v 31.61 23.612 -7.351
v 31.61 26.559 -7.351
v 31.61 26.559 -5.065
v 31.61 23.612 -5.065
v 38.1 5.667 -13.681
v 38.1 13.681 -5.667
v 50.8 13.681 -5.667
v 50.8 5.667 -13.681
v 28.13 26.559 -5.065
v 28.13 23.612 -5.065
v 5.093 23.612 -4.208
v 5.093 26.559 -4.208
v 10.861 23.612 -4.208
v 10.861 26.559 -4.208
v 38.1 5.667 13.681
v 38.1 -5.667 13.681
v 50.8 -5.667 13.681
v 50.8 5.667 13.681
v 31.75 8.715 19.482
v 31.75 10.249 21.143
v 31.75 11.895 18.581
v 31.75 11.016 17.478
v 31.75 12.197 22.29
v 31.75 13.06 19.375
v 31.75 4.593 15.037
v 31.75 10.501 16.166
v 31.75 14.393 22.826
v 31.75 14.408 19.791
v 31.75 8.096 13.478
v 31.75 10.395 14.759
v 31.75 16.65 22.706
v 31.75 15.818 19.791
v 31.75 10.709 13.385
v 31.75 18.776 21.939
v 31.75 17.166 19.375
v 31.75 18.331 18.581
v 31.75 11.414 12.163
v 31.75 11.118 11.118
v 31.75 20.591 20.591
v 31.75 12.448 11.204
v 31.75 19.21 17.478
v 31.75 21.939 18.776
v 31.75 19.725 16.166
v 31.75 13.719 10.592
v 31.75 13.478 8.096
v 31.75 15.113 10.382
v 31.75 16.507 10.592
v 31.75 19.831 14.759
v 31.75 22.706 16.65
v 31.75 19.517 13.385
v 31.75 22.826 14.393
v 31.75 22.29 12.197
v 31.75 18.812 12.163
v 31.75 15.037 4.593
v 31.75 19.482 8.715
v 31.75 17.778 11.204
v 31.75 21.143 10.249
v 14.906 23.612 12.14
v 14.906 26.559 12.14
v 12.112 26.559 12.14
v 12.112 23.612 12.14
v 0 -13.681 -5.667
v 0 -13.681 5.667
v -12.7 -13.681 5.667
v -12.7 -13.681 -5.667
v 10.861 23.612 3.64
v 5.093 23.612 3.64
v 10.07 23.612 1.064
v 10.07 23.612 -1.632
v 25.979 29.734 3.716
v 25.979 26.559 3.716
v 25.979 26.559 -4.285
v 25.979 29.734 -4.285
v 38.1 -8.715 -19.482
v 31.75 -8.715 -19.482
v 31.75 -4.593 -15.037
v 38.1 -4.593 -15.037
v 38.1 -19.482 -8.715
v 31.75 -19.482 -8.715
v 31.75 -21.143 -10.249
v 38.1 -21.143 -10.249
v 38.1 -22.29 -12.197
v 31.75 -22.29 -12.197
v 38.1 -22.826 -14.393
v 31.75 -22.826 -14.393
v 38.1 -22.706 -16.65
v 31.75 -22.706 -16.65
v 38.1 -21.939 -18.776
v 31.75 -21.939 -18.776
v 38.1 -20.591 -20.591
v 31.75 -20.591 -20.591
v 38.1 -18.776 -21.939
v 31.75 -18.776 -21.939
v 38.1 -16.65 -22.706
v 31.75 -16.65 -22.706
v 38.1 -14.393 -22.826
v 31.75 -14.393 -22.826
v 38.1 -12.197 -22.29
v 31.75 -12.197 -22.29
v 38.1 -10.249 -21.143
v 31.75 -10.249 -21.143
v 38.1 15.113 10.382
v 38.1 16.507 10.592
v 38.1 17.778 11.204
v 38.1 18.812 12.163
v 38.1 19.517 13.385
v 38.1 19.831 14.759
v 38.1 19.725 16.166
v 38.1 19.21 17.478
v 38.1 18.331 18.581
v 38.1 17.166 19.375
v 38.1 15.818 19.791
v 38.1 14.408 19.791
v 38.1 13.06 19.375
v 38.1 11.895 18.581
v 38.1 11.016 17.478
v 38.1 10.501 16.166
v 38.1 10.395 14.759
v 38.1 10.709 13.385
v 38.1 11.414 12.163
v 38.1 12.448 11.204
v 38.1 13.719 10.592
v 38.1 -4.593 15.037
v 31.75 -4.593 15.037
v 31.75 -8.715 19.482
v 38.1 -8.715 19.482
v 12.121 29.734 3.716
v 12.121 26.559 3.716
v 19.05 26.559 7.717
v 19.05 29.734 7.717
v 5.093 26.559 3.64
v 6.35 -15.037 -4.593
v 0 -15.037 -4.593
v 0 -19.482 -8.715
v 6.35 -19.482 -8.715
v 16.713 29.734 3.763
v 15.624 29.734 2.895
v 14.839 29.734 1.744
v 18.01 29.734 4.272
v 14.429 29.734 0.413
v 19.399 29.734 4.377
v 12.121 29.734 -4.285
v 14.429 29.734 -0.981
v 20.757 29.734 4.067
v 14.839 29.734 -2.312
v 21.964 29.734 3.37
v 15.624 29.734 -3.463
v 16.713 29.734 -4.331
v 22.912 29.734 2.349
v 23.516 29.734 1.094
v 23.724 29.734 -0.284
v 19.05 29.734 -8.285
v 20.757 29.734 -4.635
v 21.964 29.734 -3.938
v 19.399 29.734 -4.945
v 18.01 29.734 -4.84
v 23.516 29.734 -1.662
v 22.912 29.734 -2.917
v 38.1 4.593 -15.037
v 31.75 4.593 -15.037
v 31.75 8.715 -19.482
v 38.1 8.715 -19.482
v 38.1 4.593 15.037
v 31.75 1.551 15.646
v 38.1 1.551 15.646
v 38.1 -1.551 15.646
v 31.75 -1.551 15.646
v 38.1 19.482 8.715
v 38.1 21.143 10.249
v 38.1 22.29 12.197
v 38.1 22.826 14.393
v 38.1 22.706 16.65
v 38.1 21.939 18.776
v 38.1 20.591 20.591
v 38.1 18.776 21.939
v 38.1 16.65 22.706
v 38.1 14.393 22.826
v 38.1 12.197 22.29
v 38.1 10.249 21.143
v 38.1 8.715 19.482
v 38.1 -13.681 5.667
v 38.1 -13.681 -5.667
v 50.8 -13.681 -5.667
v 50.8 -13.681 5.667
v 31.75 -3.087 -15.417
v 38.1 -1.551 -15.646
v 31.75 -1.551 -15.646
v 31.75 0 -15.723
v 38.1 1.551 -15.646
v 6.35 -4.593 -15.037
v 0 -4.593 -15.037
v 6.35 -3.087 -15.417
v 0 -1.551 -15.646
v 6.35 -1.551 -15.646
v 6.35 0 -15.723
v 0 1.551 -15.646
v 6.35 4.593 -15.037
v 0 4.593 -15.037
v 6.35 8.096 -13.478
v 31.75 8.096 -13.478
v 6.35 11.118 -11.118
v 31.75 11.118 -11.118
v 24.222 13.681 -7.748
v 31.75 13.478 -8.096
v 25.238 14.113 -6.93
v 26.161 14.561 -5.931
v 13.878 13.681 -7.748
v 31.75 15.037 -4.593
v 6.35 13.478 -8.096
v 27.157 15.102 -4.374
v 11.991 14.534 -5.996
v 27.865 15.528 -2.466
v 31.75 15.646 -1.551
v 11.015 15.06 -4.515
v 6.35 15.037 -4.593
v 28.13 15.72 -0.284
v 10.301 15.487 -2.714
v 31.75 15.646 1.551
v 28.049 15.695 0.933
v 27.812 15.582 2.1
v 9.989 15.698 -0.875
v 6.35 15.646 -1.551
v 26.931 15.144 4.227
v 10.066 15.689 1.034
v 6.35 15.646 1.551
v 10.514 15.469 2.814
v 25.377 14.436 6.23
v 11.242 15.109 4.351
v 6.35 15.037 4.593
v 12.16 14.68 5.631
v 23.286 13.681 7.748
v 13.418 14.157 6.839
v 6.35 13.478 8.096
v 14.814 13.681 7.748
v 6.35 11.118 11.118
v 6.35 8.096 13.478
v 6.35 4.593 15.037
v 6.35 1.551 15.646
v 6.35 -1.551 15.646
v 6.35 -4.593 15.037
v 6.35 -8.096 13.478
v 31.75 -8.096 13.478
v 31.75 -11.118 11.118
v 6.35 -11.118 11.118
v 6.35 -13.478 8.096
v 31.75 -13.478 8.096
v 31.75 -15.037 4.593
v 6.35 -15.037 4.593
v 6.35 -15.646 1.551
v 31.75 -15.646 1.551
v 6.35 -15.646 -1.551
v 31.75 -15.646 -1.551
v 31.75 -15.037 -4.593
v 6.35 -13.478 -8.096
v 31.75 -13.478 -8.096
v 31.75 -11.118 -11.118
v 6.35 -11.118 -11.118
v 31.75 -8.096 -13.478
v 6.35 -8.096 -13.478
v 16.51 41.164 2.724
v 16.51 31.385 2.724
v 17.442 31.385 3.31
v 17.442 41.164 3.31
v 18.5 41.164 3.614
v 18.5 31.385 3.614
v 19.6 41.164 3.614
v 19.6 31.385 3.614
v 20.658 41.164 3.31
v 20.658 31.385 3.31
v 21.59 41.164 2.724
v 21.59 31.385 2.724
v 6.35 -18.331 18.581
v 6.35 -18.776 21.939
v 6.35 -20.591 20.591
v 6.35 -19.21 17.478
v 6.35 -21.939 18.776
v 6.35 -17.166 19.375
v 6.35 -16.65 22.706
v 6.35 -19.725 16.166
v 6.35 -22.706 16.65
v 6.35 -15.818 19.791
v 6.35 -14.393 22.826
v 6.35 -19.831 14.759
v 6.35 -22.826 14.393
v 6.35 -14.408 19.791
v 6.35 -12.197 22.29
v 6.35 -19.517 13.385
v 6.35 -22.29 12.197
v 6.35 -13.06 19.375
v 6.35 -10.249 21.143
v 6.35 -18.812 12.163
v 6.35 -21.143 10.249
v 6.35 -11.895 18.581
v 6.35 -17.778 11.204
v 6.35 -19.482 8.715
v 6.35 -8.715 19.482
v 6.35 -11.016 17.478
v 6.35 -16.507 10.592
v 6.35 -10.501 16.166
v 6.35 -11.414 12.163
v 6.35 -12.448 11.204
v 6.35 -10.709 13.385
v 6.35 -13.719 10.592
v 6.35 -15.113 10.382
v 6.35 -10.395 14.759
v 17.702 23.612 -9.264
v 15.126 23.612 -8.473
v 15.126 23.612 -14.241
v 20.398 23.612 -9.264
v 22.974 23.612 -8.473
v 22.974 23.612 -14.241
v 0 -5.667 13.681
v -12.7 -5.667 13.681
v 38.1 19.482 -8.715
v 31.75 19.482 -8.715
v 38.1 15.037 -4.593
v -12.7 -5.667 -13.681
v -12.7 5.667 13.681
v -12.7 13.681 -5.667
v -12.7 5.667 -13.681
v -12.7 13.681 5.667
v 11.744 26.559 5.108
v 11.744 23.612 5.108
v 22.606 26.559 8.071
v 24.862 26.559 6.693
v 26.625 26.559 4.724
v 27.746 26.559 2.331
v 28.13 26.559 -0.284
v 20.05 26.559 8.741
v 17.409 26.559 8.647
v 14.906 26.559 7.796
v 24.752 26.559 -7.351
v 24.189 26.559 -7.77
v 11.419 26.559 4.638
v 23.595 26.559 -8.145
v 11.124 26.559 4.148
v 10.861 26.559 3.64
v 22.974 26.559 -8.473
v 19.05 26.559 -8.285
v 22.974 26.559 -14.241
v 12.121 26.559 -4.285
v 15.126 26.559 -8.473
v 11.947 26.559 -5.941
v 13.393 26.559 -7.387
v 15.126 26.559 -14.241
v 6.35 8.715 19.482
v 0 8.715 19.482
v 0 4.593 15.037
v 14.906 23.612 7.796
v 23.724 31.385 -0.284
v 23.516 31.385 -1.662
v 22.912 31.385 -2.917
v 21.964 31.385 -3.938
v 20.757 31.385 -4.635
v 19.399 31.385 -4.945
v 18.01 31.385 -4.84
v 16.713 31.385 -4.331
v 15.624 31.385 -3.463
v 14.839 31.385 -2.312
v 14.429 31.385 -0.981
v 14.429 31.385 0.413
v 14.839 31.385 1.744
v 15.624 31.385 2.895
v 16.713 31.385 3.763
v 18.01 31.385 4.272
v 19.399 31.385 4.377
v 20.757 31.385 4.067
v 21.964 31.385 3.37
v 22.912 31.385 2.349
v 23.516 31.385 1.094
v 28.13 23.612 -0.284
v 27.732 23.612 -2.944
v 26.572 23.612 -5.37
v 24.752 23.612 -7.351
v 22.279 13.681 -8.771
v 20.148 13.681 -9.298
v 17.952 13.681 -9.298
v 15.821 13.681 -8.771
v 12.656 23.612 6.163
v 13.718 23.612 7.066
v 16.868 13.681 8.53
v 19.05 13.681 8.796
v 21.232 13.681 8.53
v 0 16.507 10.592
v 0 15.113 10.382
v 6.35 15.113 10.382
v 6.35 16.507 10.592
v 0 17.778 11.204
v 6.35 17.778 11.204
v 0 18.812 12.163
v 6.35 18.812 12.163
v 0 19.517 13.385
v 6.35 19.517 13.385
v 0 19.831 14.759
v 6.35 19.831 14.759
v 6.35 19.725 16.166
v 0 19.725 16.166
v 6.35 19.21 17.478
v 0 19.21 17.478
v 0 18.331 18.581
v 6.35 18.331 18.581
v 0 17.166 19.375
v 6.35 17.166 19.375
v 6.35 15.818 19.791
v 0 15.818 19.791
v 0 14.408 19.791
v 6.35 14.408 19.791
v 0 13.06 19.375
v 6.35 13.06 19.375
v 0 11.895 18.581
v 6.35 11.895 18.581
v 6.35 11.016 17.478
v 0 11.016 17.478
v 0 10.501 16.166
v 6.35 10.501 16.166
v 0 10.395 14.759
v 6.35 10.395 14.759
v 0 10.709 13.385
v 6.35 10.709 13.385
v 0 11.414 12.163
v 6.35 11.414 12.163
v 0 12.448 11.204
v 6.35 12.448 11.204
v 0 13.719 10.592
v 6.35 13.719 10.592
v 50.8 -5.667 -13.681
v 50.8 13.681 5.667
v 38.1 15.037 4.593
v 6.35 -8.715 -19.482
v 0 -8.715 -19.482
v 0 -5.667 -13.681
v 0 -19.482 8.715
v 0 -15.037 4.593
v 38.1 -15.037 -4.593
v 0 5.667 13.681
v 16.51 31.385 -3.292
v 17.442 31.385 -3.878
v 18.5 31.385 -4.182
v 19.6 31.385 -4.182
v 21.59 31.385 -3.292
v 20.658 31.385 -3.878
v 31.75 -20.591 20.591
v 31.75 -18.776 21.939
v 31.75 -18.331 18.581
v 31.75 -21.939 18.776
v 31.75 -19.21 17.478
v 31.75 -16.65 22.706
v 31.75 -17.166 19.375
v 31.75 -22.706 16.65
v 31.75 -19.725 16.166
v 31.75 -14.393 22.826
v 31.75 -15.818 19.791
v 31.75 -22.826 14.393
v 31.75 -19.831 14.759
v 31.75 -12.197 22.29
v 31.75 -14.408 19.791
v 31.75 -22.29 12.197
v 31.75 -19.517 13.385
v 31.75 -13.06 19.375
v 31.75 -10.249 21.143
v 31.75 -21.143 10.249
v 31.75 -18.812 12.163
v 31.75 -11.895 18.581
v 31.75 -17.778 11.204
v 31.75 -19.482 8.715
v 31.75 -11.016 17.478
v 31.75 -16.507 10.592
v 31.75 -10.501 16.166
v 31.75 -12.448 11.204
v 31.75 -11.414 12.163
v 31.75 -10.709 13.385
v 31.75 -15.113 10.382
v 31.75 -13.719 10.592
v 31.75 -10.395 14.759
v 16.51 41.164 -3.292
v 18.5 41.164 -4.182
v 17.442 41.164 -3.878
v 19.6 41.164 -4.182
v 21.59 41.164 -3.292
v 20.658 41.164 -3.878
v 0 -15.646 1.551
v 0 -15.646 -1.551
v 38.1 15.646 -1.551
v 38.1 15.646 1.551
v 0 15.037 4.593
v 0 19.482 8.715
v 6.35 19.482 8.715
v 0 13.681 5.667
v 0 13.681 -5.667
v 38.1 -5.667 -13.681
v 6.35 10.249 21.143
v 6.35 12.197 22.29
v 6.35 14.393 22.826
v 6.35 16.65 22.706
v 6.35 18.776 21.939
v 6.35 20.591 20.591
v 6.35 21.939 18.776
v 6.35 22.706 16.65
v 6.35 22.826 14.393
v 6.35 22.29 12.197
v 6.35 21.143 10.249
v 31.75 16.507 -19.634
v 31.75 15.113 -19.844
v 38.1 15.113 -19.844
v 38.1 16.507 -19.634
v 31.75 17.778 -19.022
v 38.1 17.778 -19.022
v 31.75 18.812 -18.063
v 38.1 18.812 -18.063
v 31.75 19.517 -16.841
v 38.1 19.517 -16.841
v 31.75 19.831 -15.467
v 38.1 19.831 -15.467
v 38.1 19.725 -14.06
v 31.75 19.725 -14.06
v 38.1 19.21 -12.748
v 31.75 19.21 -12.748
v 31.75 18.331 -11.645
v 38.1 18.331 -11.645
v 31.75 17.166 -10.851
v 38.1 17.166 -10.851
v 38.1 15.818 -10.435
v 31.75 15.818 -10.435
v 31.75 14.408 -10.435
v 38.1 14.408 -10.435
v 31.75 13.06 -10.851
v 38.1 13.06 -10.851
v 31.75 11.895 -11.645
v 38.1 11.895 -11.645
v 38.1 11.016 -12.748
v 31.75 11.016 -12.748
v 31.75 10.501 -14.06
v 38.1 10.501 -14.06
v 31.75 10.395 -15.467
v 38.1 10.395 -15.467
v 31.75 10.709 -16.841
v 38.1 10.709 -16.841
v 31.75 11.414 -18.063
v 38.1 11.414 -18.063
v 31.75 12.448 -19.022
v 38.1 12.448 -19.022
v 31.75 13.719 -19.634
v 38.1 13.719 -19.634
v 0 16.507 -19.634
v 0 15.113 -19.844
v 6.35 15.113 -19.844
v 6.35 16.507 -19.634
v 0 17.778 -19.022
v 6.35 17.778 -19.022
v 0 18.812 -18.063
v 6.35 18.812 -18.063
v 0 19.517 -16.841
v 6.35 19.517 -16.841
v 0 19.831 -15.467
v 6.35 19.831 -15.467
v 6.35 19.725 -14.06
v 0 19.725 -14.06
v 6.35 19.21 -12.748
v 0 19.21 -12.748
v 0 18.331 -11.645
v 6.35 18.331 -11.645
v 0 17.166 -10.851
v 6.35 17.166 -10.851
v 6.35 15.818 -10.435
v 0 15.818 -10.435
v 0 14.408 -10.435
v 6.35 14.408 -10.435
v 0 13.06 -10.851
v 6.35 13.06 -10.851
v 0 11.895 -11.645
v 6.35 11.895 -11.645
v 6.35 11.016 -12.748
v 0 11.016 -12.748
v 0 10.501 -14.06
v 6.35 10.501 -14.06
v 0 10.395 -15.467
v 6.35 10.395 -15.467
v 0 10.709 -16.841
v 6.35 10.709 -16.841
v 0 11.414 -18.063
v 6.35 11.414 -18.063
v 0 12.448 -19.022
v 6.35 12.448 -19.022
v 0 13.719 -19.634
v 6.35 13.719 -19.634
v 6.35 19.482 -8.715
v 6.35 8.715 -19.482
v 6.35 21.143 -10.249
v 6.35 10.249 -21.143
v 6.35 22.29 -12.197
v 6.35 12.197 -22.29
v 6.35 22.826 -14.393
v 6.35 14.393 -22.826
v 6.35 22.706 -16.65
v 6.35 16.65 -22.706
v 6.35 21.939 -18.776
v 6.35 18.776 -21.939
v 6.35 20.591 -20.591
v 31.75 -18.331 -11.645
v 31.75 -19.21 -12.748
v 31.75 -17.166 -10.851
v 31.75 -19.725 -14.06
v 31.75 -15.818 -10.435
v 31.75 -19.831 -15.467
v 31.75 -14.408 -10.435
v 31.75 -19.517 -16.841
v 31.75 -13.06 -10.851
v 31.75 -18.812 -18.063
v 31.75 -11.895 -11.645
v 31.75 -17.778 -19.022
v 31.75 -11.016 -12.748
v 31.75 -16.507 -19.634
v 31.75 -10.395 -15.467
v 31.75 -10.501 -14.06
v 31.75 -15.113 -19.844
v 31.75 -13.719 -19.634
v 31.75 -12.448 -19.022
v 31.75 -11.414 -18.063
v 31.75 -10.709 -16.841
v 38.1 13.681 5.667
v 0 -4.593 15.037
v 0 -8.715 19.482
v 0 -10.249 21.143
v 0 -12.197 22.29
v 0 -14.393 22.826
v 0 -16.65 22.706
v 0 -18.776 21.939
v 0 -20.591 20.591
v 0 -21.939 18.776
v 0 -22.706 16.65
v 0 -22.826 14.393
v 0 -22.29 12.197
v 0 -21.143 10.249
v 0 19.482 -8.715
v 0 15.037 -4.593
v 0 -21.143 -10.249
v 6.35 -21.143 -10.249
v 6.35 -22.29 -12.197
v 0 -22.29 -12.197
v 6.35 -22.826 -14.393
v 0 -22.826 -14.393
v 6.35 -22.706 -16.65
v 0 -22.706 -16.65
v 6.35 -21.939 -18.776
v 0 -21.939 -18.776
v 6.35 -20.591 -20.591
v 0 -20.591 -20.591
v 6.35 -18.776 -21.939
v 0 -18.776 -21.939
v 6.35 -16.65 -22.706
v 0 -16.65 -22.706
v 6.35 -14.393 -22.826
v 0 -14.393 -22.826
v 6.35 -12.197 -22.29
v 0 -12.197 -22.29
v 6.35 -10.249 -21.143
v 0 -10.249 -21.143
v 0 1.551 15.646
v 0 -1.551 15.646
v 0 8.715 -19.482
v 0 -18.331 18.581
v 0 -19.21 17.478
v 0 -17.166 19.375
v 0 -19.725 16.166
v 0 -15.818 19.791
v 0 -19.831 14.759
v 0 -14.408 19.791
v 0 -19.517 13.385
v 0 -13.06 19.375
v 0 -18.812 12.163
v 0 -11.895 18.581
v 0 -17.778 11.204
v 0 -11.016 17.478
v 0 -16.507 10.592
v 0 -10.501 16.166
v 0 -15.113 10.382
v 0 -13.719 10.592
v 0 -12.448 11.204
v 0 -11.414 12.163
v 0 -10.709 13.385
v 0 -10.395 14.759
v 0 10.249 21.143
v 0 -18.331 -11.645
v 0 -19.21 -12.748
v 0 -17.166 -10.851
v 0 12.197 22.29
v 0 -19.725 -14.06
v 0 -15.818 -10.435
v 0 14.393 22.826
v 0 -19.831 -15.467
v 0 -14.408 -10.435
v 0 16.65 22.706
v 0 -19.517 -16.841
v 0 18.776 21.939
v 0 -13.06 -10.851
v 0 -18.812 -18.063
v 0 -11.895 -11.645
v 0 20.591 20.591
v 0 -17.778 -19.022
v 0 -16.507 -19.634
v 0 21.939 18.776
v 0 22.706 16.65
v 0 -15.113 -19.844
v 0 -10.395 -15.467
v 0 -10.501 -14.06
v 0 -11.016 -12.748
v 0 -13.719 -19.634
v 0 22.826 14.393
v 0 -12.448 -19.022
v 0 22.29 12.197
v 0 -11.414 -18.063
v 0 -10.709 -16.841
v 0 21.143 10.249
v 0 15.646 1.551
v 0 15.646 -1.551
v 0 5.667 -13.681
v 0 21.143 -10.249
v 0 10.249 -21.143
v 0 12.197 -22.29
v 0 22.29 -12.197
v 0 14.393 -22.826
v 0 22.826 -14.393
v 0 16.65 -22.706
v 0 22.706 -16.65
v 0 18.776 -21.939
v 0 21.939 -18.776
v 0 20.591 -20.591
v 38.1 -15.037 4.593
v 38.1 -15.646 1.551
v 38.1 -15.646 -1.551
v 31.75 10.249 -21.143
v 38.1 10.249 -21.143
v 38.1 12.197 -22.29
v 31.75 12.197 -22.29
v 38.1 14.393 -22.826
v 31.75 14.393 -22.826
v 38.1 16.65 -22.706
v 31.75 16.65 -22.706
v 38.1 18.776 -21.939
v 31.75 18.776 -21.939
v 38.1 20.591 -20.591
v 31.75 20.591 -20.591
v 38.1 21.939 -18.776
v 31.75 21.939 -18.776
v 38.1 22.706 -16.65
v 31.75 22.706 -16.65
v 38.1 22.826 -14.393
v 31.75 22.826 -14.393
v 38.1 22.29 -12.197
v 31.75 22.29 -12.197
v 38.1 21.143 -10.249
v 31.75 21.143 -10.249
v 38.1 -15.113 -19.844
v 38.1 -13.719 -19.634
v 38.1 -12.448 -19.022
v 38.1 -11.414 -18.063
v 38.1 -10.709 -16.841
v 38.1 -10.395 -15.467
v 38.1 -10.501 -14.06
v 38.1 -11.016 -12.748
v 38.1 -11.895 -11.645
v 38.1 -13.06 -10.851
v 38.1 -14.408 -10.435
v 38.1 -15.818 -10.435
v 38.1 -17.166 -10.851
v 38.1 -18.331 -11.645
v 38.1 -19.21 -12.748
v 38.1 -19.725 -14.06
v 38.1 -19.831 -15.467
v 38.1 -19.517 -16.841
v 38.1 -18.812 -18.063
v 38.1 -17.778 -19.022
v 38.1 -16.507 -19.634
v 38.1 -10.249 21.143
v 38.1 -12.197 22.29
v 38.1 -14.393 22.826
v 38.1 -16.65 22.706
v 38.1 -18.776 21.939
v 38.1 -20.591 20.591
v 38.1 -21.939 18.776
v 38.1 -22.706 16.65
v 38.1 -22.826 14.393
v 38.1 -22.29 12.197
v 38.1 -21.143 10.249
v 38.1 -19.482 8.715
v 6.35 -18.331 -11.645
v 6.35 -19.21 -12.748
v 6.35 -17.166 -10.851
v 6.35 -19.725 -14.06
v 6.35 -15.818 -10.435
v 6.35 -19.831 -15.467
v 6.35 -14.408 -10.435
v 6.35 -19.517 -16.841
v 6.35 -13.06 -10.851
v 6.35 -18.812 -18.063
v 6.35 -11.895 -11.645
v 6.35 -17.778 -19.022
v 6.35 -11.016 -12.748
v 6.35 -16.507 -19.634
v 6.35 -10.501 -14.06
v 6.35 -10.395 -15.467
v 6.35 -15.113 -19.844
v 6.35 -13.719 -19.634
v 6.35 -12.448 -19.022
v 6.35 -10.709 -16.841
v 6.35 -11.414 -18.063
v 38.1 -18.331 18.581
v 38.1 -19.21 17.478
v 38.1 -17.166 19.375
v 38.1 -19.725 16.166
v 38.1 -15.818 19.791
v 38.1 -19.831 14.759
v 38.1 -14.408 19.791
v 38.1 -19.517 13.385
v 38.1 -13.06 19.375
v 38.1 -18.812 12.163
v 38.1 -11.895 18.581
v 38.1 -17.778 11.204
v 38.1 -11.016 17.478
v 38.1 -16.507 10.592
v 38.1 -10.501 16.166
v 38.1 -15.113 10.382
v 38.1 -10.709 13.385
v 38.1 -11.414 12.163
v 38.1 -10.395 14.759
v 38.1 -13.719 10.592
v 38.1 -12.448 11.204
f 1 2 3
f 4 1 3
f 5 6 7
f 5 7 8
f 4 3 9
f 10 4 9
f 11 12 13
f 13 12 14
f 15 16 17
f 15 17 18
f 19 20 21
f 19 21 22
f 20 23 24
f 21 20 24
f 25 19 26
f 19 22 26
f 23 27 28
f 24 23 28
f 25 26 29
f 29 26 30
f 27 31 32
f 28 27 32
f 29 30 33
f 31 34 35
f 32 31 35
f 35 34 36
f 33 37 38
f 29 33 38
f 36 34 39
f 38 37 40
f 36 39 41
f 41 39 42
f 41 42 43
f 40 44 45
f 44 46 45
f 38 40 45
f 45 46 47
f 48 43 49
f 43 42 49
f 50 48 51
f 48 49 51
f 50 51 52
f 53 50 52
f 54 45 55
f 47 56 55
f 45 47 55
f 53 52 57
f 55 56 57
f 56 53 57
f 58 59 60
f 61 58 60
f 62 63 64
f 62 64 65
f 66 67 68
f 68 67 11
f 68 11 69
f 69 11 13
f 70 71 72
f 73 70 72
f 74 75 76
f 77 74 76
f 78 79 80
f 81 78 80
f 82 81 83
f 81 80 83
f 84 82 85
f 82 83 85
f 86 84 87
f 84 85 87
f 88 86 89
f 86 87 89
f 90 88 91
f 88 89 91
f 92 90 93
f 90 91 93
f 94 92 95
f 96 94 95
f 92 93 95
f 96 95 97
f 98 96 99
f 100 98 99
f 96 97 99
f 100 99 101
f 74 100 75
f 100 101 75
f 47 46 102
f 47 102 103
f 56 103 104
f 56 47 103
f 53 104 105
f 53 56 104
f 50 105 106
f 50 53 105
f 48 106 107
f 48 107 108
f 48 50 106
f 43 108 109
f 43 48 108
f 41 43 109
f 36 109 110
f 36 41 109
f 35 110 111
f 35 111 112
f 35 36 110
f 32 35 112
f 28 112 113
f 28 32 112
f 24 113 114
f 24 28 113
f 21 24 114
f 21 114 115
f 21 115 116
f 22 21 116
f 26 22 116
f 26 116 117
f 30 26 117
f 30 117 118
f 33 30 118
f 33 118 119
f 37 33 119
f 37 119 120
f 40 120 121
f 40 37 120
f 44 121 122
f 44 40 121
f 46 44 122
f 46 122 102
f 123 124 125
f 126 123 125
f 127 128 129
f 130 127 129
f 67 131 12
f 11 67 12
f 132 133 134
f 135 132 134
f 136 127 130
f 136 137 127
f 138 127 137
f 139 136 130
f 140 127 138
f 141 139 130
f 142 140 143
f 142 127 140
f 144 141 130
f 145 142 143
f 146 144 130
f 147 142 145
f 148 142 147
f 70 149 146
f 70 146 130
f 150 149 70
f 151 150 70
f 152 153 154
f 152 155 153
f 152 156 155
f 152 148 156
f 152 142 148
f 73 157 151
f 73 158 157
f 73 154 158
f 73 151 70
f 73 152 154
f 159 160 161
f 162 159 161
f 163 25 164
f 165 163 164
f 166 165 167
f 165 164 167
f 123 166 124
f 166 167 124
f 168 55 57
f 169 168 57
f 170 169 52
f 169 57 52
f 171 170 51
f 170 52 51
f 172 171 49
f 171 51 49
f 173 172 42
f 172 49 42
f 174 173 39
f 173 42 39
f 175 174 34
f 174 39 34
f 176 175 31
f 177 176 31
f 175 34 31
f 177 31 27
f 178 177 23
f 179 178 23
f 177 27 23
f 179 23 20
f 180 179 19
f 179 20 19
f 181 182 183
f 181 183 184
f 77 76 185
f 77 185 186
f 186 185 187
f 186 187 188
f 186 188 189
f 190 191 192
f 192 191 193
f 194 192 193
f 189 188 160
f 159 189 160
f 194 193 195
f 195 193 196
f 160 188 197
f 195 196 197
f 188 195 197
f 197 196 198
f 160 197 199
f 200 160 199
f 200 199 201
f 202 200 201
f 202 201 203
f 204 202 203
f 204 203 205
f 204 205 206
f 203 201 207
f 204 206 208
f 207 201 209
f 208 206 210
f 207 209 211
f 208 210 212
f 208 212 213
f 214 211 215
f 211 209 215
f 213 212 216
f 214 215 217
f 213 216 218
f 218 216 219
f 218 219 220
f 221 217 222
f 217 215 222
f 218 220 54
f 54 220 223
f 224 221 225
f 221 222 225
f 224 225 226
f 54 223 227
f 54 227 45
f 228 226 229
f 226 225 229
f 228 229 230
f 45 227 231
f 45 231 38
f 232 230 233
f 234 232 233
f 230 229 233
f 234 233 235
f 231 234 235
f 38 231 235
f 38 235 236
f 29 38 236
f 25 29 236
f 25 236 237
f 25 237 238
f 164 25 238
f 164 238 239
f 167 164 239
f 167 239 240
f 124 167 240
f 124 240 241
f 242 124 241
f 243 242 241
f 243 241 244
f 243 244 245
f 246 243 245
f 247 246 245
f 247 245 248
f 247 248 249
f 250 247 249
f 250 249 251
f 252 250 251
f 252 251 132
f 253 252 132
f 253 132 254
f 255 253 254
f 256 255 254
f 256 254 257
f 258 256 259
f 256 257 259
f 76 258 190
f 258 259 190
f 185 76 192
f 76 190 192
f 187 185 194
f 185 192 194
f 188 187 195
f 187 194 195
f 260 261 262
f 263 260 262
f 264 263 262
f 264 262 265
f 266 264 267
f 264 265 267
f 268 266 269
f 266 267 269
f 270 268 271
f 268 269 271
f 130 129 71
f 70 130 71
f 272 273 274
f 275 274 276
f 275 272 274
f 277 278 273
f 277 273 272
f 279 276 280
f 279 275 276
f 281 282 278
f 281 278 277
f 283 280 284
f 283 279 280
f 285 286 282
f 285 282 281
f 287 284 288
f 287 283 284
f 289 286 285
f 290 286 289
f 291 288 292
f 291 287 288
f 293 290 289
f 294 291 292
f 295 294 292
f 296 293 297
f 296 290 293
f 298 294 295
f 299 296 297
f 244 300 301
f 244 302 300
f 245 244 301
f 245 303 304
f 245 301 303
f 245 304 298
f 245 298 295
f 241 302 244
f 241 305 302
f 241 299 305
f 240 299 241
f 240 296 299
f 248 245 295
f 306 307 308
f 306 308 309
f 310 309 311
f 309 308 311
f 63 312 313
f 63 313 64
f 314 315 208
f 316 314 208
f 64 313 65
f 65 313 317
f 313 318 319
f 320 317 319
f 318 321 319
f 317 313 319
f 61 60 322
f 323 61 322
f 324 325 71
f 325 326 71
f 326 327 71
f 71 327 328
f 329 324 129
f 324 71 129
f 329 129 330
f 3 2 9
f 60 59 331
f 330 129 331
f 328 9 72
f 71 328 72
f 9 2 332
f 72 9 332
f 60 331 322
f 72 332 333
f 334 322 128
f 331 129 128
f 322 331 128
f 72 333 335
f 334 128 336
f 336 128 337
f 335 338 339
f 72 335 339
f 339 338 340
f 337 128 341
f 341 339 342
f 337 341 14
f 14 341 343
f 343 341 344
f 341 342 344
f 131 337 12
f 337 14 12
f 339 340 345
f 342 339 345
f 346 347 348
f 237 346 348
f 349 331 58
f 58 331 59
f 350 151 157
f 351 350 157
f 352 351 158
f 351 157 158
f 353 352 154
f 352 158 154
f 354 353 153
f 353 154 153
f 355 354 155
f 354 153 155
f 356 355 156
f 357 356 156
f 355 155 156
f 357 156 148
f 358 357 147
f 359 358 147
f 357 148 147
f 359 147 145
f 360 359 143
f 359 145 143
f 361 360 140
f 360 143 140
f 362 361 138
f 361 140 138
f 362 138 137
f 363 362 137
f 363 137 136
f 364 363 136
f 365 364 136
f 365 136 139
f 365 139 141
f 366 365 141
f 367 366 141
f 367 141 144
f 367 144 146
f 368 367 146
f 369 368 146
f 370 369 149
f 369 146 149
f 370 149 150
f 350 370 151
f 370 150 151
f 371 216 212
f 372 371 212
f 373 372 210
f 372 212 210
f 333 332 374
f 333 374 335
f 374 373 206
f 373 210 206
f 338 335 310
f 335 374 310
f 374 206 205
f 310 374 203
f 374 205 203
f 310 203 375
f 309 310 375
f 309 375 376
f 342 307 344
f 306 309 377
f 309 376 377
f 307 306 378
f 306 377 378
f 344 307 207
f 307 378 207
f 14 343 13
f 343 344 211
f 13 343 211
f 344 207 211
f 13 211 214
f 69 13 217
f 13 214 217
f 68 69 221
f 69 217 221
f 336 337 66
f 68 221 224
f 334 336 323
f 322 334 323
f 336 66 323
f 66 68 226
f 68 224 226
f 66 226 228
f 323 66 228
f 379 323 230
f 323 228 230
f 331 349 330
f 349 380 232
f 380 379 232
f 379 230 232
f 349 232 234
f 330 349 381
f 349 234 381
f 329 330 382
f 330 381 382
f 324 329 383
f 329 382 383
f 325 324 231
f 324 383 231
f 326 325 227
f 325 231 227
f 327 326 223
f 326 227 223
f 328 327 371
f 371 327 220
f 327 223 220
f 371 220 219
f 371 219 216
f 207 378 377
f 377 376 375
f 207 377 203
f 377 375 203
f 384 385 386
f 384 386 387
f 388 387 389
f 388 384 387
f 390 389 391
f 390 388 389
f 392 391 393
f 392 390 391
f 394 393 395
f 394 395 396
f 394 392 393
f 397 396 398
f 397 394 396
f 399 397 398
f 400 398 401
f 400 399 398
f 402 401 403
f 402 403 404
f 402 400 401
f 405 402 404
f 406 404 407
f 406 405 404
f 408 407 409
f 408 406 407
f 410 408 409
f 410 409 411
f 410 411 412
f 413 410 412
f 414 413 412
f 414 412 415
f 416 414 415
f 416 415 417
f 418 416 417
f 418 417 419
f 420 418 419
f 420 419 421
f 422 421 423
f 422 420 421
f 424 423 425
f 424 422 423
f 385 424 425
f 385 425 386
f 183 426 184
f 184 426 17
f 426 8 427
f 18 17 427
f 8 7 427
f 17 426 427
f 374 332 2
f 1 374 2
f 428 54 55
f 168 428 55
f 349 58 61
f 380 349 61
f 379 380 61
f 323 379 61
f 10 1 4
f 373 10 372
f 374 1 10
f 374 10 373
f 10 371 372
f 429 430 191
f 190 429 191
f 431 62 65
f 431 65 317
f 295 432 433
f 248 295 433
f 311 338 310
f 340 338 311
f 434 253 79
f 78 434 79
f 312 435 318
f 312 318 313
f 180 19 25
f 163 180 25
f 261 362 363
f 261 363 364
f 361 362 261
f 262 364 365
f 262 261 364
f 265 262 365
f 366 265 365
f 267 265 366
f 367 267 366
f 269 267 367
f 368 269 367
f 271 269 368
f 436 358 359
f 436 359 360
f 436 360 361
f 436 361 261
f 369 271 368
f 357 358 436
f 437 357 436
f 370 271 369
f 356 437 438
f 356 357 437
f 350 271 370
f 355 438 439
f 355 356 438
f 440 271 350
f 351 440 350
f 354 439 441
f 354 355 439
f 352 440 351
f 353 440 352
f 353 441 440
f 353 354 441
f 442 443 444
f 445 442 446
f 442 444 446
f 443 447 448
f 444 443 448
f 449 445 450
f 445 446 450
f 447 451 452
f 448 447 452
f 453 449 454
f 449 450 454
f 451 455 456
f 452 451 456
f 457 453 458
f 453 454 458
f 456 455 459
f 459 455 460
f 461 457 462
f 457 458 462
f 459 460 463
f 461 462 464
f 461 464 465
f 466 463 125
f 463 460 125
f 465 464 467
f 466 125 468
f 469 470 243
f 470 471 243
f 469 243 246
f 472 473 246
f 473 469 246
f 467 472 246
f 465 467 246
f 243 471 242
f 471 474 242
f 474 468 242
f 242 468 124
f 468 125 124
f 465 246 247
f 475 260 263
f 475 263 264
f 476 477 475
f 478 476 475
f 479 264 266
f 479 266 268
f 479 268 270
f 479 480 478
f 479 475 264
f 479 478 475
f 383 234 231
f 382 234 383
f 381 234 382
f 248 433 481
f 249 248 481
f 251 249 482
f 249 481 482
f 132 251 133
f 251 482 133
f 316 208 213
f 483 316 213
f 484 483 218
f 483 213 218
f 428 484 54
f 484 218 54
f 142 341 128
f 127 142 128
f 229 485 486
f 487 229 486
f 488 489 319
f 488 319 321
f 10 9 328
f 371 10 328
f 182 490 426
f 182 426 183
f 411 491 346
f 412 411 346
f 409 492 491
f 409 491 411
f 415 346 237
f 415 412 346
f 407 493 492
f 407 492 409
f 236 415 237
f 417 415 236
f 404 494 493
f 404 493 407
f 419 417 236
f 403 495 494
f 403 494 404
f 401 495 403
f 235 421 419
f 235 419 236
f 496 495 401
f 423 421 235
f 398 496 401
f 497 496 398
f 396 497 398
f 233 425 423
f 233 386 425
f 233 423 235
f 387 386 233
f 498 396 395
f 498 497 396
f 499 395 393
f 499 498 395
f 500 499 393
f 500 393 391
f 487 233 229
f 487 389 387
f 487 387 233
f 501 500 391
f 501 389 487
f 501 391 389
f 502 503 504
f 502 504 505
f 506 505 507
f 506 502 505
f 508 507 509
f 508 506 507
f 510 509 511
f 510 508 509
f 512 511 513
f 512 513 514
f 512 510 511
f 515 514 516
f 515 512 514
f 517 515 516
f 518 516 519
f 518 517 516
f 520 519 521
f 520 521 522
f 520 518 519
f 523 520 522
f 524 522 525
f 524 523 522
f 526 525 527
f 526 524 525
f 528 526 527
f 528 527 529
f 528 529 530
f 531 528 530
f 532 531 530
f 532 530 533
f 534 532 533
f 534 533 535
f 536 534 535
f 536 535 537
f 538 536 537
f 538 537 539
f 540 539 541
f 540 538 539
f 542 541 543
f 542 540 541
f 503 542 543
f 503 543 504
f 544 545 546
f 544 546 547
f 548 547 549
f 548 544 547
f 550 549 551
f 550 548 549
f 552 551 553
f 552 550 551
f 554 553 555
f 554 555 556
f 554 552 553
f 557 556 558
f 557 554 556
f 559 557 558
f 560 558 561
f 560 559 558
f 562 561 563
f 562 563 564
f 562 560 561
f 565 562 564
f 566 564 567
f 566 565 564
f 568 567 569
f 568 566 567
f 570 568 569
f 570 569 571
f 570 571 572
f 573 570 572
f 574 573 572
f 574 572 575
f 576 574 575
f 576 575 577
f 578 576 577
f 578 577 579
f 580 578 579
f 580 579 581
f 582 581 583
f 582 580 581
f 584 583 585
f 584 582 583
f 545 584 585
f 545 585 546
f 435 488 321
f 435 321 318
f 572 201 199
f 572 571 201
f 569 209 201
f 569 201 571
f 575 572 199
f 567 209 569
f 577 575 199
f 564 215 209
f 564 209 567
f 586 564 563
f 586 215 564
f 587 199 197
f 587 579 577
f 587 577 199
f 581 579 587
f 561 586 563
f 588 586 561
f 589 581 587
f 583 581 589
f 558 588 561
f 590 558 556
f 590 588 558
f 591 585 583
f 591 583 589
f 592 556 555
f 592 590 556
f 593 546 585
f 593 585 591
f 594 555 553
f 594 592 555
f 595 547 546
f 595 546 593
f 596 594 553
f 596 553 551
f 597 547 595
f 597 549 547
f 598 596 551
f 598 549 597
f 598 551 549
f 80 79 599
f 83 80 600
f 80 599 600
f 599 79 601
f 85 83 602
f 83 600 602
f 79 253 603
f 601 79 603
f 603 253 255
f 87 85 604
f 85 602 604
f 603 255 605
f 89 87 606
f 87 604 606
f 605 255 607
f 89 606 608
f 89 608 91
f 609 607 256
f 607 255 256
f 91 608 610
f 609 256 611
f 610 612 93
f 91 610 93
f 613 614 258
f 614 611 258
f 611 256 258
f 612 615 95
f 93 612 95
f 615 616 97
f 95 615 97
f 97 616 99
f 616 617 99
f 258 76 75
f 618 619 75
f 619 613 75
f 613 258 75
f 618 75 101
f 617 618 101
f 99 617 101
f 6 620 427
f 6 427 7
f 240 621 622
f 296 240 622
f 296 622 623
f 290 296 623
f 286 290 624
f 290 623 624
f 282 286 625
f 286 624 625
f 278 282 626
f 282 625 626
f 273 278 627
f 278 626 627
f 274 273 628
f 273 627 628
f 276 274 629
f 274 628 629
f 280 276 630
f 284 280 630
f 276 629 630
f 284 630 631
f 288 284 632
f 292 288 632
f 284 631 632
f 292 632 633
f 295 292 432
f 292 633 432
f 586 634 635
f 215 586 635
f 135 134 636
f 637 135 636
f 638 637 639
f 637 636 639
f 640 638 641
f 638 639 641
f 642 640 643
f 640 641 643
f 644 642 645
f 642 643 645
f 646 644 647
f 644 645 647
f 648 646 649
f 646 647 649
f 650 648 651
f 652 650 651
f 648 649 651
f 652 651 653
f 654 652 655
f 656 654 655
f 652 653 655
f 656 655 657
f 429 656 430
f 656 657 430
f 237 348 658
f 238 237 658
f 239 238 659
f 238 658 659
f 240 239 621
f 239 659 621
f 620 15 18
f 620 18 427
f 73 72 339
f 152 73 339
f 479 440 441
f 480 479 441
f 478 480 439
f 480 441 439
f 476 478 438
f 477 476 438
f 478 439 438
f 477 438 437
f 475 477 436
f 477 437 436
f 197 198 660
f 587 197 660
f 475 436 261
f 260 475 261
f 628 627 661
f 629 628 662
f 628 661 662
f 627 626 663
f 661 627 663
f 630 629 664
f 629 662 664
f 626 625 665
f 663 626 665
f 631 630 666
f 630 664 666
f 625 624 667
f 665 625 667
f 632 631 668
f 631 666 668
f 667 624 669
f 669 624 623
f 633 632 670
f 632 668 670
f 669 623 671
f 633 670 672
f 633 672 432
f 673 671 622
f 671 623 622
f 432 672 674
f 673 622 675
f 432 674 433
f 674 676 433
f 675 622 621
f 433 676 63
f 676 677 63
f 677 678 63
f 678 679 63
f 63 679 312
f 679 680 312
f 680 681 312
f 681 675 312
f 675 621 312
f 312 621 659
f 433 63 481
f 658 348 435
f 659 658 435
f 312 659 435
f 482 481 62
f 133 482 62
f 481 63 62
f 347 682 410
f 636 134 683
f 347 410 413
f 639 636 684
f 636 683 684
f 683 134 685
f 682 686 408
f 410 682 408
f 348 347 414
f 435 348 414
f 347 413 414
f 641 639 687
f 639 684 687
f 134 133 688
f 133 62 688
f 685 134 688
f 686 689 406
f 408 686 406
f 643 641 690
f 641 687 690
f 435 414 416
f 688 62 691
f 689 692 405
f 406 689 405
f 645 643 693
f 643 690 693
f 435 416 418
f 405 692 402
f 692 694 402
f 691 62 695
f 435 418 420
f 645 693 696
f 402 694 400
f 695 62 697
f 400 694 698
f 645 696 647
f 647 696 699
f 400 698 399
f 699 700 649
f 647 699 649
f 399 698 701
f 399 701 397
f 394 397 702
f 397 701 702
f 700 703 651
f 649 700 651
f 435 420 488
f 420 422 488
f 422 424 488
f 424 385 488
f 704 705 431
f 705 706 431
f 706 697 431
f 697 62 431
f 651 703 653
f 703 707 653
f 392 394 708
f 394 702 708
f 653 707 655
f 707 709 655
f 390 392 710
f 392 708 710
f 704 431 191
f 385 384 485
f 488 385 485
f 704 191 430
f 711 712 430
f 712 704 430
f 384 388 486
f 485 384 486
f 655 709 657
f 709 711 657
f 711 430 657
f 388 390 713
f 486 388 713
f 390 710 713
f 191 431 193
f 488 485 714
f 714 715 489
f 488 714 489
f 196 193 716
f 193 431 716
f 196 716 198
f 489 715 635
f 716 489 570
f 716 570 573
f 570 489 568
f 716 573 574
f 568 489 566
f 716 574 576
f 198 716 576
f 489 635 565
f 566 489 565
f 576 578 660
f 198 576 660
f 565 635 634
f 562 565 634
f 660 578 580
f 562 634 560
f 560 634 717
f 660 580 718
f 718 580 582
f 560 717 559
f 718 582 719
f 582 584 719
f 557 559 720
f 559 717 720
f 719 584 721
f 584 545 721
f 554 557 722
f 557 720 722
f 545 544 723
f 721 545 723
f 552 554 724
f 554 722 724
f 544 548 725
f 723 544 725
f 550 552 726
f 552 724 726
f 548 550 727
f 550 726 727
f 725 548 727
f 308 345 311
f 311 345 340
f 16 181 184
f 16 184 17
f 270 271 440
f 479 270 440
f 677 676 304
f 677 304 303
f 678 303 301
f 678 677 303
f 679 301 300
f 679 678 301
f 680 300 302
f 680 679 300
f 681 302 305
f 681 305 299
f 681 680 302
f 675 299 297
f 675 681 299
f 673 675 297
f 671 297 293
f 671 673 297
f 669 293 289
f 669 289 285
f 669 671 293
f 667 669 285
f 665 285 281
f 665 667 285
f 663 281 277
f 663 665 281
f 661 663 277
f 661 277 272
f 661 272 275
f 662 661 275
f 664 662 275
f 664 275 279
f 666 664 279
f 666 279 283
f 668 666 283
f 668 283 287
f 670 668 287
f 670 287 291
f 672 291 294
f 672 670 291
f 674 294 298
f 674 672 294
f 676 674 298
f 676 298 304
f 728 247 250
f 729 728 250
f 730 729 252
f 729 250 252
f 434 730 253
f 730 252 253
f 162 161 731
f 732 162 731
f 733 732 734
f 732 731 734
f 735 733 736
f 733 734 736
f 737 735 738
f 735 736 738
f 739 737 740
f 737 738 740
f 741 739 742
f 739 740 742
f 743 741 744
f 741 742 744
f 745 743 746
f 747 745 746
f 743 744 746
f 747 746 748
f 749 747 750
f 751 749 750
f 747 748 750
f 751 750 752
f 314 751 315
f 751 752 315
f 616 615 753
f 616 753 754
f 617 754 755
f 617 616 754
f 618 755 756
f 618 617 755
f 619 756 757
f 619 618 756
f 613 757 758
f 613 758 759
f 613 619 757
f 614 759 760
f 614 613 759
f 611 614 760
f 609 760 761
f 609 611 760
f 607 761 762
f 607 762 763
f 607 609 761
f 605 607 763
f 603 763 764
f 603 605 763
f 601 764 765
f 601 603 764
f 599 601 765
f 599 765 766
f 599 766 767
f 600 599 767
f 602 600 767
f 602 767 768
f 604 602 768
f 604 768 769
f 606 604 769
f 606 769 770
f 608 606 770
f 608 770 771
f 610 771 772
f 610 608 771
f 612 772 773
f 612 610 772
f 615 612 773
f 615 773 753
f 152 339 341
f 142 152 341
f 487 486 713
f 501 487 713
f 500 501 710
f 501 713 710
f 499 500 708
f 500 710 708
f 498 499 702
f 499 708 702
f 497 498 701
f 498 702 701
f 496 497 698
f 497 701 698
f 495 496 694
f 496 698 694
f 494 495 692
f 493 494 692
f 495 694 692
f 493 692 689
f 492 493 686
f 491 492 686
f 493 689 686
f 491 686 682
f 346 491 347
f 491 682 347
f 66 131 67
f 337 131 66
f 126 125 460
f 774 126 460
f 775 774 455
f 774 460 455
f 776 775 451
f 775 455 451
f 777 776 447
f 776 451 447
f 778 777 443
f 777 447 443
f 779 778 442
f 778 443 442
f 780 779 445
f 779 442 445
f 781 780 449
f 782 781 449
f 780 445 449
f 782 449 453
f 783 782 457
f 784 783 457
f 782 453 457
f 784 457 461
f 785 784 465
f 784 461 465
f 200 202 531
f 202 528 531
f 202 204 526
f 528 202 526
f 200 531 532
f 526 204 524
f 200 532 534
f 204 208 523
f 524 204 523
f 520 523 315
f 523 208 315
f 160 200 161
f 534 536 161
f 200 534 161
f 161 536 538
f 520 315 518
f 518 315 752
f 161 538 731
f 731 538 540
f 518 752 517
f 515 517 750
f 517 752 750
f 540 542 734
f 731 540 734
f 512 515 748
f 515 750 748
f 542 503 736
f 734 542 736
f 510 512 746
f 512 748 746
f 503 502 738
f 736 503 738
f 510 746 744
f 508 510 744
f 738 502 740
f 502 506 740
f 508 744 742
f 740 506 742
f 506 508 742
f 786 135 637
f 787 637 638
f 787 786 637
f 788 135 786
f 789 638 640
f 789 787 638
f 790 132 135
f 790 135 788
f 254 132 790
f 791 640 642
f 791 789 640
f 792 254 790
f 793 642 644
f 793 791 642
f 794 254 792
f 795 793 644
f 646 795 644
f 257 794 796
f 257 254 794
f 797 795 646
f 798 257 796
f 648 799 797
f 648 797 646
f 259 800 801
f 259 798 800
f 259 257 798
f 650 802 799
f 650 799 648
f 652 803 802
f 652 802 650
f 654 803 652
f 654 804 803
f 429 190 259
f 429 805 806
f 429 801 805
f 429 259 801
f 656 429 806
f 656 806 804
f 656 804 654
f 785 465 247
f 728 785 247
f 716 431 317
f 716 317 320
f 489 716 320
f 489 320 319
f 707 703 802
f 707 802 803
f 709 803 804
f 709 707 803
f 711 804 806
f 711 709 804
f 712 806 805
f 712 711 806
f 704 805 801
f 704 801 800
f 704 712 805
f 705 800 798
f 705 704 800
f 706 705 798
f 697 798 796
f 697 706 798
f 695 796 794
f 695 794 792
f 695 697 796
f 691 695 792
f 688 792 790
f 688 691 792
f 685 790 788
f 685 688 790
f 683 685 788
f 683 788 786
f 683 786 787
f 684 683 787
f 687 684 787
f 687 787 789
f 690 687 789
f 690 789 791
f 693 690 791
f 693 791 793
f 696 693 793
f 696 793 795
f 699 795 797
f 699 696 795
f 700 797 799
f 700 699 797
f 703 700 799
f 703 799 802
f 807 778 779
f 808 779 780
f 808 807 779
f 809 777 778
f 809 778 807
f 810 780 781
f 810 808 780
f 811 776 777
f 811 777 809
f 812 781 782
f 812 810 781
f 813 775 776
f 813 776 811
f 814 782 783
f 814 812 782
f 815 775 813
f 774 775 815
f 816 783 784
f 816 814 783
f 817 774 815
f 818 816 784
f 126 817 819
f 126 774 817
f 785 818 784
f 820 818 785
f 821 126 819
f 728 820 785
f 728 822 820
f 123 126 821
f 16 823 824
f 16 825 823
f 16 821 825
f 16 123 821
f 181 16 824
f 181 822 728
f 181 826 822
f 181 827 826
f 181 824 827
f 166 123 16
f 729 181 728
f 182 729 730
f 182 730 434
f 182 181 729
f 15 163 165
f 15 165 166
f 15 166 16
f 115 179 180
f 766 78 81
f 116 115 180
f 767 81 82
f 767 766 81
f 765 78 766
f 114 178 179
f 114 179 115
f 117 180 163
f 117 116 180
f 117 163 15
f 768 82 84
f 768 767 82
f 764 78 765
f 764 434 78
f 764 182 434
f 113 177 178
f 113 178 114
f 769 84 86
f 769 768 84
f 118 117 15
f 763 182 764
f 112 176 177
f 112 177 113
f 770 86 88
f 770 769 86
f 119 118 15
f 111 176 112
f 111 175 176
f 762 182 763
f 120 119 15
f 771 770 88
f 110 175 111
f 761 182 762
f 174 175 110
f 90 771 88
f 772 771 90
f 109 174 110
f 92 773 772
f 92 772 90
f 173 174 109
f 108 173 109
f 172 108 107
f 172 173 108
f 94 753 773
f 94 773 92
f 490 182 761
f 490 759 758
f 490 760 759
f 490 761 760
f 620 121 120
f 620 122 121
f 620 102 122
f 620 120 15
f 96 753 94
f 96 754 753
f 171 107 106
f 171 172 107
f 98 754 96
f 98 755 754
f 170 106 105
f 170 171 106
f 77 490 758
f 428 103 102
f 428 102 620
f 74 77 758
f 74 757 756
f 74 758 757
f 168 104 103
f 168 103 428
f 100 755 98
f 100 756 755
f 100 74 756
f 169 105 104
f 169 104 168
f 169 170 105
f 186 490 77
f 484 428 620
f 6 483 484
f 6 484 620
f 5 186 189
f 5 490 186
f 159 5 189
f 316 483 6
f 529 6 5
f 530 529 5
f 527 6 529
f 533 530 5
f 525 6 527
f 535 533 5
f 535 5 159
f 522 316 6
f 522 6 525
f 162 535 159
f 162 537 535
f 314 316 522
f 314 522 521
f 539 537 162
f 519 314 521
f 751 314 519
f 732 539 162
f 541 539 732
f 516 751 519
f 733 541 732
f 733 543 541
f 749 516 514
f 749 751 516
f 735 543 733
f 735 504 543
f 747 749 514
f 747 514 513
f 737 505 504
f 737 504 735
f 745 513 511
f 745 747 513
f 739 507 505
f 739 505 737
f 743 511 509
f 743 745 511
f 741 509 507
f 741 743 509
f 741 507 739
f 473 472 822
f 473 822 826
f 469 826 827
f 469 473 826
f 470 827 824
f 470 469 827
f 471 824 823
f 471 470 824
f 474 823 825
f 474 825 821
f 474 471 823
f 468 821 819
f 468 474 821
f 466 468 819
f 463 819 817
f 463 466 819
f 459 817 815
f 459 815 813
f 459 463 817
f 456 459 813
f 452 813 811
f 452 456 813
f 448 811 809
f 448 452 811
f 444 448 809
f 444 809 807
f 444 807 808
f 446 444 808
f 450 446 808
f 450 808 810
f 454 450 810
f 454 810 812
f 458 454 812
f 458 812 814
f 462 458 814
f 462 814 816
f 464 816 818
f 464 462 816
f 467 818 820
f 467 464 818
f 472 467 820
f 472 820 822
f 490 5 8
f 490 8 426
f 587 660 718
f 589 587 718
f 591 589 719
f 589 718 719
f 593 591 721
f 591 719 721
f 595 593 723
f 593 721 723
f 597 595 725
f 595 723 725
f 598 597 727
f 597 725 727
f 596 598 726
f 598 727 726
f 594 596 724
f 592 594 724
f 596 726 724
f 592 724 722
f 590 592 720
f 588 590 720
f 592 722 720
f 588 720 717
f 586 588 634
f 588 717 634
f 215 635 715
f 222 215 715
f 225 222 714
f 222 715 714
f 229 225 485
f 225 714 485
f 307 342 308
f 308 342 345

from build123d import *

# Parameters (mm, degrees)
SKETCH1_R            = 4.73075
BOSS_EXTRUDE2_DEPTH  = 6.35
BOSS_EXTRUDE3_DEPTH  = 12.7
SKETCH3_R            = 15.7226
BOSS_EXTRUDE4_DEPTH  = 25.4
SKETCH4_R            = 4.73075
BOSS_EXTRUDE5_DEPTH  = 6.35
BOSS_EXTRUDE6_DEPTH  = 12.7
SKETCH6_R            = 9.0805
BOSS_EXTRUDE8_DEPTH  = 12.8778
SKETCH8_W            = 7.8486
SKETCH8_H            = 8.0772
SKETCH8_W_2          = 8.0772
SKETCH8_H_2          = 7.8486
BOSS_EXTRUDE9_DEPTH  = 2.9464
BOSS_EXTRUDE10_DEPTH = 2.9464
BOSS_EXTRUDE11_DEPTH = 3.175
SKETCH12_R           = 4.6736
BOSS_EXTRUDE12_DEPTH = 1.651
BOSS_EXTRUDE13_DEPTH = 9.779


with BuildPart() as part:
    # Sketch1 → Boss-Extrude2 (new body)
    with BuildSketch(Plane(origin=(0, 0, 0), x_dir=(0, 0, -1), z_dir=(1, 0, 0))):
        with BuildLine():
            Line((-19.4818, 8.715375788), (-15.0368, 4.592907197))
            ThreePointArc((-15.0368, 4.592907197), (-15.7226, 0), (-15.0368, -4.592907197))
            Line((-15.0368, -4.592907197), (-19.4818, -8.715375788))
            ThreePointArc((-19.4818, -8.715375788), (-20.590956234, -20.590956234), (-8.715375788, -19.4818))
            Line((-8.715375788, -19.4818), (-4.592907197, -15.0368))
            ThreePointArc((-4.592907197, -15.0368), (0, -15.7226), (4.592907197, -15.0368))
            Line((4.592907197, -15.0368), (8.715375788, -19.4818))
            ThreePointArc((8.715375788, -19.4818), (20.590956234, -20.590956234), (19.4818, -8.715375788))
            Line((19.4818, -8.715375788), (15.0368, -4.592907197))
            ThreePointArc((15.0368, -4.592907197), (15.7226, 0), (15.0368, 4.592907197))
            Line((15.0368, 4.592907197), (19.4818, 8.715375788))
            ThreePointArc((19.4818, 8.715375788), (20.590956234, 20.590956234), (8.715375788, 19.4818))
            Line((8.715375788, 19.4818), (4.592907197, 15.0368))
            ThreePointArc((4.592907197, 15.0368), (0, 15.7226), (-4.592907197, 15.0368))
            Line((-4.592907197, 15.0368), (-8.715375788, 19.4818))
            ThreePointArc((-8.715375788, 19.4818), (-20.590956234, 20.590956234), (-19.4818, 8.715375788))
        make_face()
        with Locations((-15.113, 15.113)):
            Circle(SKETCH1_R, mode=Mode.SUBTRACT)
        with Locations((15.113, 15.113)):
            Circle(SKETCH1_R, mode=Mode.SUBTRACT)
        with Locations((15.113, -15.113)):
            Circle(SKETCH1_R, mode=Mode.SUBTRACT)
        with Locations((-15.113, -15.113)):
            Circle(SKETCH1_R, mode=Mode.SUBTRACT)
    extrude(amount=BOSS_EXTRUDE2_DEPTH)

    # Sketch2 → Boss-Extrude3 (add)
    with BuildSketch(Plane.ZY):
        Polygon((13.680992893, 5.666852803), (13.680992893, -5.666852803), (5.666852803, -13.680992893), (-5.666852803, -13.680992893), (-13.680992893, -5.666852803), (-13.680992893, 5.666852803), (-5.666852803, 13.680992893), (5.666852803, 13.680992893), align=None)
    extrude(amount=BOSS_EXTRUDE3_DEPTH)

    # Sketch3 → Boss-Extrude4 (add)
    with BuildSketch(Plane(origin=(6.35, 0, 0), x_dir=(0, 0, -1), z_dir=(1, 0, 0))):
        Circle(SKETCH3_R)
    extrude(amount=BOSS_EXTRUDE4_DEPTH)

    # Sketch4 → Boss-Extrude5 (add)
    with BuildSketch(Plane(origin=(31.75, 0, 0), x_dir=(0, 0, -1), z_dir=(1, 0, 0))):
        with BuildLine():
            Line((-19.4818, 8.715375788), (-15.0368, 4.592907197))
            ThreePointArc((-15.0368, 4.592907197), (-15.7226, 0), (-15.0368, -4.592907197))
            Line((-15.0368, -4.592907197), (-19.4818, -8.715375788))
            ThreePointArc((-19.4818, -8.715375788), (-20.590956234, -20.590956234), (-8.715375788, -19.4818))
            Line((-8.715375788, -19.4818), (-4.592907197, -15.0368))
            ThreePointArc((-4.592907197, -15.0368), (0, -15.7226), (4.592907197, -15.0368))
            Line((4.592907197, -15.0368), (8.715375788, -19.4818))
            ThreePointArc((8.715375788, -19.4818), (20.590956234, -20.590956234), (19.4818, -8.715375788))
            Line((19.4818, -8.715375788), (15.0368, -4.592907197))
            ThreePointArc((15.0368, -4.592907197), (15.7226, 0), (15.0368, 4.592907197))
            Line((15.0368, 4.592907197), (19.4818, 8.715375788))
            ThreePointArc((19.4818, 8.715375788), (20.590956234, 20.590956234), (8.715375788, 19.4818))
            Line((8.715375788, 19.4818), (4.592907197, 15.0368))
            ThreePointArc((4.592907197, 15.0368), (0, 15.7226), (-4.592907197, 15.0368))
            Line((-4.592907197, 15.0368), (-8.715375788, 19.4818))
            ThreePointArc((-8.715375788, 19.4818), (-20.590956234, 20.590956234), (-19.4818, 8.715375788))
        make_face()
        with Locations((-15.113, 15.113)):
            Circle(SKETCH4_R, mode=Mode.SUBTRACT)
        with Locations((15.113, 15.113)):
            Circle(SKETCH4_R, mode=Mode.SUBTRACT)
        with Locations((15.113, -15.113)):
            Circle(SKETCH4_R, mode=Mode.SUBTRACT)
        with Locations((-15.113, -15.113)):
            Circle(SKETCH4_R, mode=Mode.SUBTRACT)
    extrude(amount=BOSS_EXTRUDE5_DEPTH)

    # Sketch5 → Boss-Extrude6 (add)
    with BuildSketch(Plane(origin=(38.1, 0, 0), x_dir=(0, 0, -1), z_dir=(1, 0, 0))):
        Polygon((13.680992893, 5.666852803), (13.680992893, -5.666852803), (5.666852803, -13.680992893), (-5.666852803, -13.680992893), (-13.680992893, -5.666852803), (-13.680992893, 5.666852803), (-5.666852803, 13.680992893), (5.666852803, 13.680992893), align=None)
    extrude(amount=BOSS_EXTRUDE6_DEPTH)

    # Sketch6 → Boss-Extrude8 (add)
    with BuildSketch(Plane(origin=(0, 13.680992893, 0), x_dir=(1, 0, 0), z_dir=(0, 1, 0))):
        with Locations((19.05, 0.284018035)):
            Circle(SKETCH6_R)
    extrude(amount=BOSS_EXTRUDE8_DEPTH)

    # Sketch8 → Boss-Extrude9 (add)
    with BuildSketch(Plane(origin=(0, 26.558792893, 0), x_dir=(1, 0, 0), z_dir=(0, 1, 0))):
        with Locations((19.05, 10.202718035)):
            Rectangle(SKETCH8_W, SKETCH8_H)
        with Locations((9.1313, 0.284018035)):
            Rectangle(SKETCH8_W_2, SKETCH8_H_2)
    extrude(amount=-BOSS_EXTRUDE9_DEPTH)

    # Sketch10 → Boss-Extrude10 (add)
    with BuildSketch(Plane(origin=(0, 26.558792893, 0), x_dir=(1, 0, 0), z_dir=(0, 1, 0))):
        with BuildLine():
            Line((24.7523, 7.350789218), (31.6103, 7.350789218))
            Line((31.6103, 7.350789218), (31.6103, 5.064789218))
            Line((31.6103, 5.064789218), (28.1305, 5.064789218))
            Line((28.1305, 5.064789218), (28.1305, 0.284018035))
            ThreePointArc((28.1305, 0.284018035), (23.784459378, -7.464554392), (14.90647607, -7.795999892))
            Line((14.90647607, -7.795999892), (14.90647607, -12.140453608))
            Line((14.90647607, -12.140453608), (12.11247607, -12.140453608))
            Line((12.11247607, -12.140453608), (11.743935589, -5.108282316))
            ThreePointArc((11.743935589, -5.108282316), (12.769066077, 6.841864427), (24.7523, 7.350789218))
        make_face()
    extrude(amount=-BOSS_EXTRUDE10_DEPTH)

    # Sketch11 → Boss-Extrude11 (add)
    with BuildSketch(Plane(origin=(0, 26.558792893, 0), x_dir=(1, 0, 0), z_dir=(0, 1, 0))):
        Polygon((19.05, 8.285018035), (12.120930744, 4.284518035), (12.120930744, -3.716481965), (19.05, -7.716981965), (25.979069256, -3.716481965), (25.979069256, 4.284518035), align=None)
    extrude(amount=BOSS_EXTRUDE11_DEPTH)

    # Sketch12 → Boss-Extrude12 (add)
    with BuildSketch(Plane(origin=(0, 29.733792893, 0), x_dir=(1, 0, 0), z_dir=(0, 1, 0))):
        with Locations((19.05, 0.284018035)):
            Circle(SKETCH12_R)
    extrude(amount=BOSS_EXTRUDE12_DEPTH)

    # Sketch13 → Boss-Extrude13 (add)
    with BuildSketch(Plane(origin=(0, 31.384792893, 0), x_dir=(1, 0, 0), z_dir=(0, 1, 0))):
        with BuildLine():
            Line((16.51, 3.292068732), (16.51, -2.724032663))
            ThreePointArc((16.51, -2.724032663), (19.05, -3.652981965), (21.59, -2.724032663))
            Line((21.59, -2.724032663), (21.59, 3.292068732))
            ThreePointArc((21.59, 3.292068732), (19.05, 4.221018035), (16.51, 3.292068732))
        make_face()
    extrude(amount=BOSS_EXTRUDE13_DEPTH)


solid = part.part
